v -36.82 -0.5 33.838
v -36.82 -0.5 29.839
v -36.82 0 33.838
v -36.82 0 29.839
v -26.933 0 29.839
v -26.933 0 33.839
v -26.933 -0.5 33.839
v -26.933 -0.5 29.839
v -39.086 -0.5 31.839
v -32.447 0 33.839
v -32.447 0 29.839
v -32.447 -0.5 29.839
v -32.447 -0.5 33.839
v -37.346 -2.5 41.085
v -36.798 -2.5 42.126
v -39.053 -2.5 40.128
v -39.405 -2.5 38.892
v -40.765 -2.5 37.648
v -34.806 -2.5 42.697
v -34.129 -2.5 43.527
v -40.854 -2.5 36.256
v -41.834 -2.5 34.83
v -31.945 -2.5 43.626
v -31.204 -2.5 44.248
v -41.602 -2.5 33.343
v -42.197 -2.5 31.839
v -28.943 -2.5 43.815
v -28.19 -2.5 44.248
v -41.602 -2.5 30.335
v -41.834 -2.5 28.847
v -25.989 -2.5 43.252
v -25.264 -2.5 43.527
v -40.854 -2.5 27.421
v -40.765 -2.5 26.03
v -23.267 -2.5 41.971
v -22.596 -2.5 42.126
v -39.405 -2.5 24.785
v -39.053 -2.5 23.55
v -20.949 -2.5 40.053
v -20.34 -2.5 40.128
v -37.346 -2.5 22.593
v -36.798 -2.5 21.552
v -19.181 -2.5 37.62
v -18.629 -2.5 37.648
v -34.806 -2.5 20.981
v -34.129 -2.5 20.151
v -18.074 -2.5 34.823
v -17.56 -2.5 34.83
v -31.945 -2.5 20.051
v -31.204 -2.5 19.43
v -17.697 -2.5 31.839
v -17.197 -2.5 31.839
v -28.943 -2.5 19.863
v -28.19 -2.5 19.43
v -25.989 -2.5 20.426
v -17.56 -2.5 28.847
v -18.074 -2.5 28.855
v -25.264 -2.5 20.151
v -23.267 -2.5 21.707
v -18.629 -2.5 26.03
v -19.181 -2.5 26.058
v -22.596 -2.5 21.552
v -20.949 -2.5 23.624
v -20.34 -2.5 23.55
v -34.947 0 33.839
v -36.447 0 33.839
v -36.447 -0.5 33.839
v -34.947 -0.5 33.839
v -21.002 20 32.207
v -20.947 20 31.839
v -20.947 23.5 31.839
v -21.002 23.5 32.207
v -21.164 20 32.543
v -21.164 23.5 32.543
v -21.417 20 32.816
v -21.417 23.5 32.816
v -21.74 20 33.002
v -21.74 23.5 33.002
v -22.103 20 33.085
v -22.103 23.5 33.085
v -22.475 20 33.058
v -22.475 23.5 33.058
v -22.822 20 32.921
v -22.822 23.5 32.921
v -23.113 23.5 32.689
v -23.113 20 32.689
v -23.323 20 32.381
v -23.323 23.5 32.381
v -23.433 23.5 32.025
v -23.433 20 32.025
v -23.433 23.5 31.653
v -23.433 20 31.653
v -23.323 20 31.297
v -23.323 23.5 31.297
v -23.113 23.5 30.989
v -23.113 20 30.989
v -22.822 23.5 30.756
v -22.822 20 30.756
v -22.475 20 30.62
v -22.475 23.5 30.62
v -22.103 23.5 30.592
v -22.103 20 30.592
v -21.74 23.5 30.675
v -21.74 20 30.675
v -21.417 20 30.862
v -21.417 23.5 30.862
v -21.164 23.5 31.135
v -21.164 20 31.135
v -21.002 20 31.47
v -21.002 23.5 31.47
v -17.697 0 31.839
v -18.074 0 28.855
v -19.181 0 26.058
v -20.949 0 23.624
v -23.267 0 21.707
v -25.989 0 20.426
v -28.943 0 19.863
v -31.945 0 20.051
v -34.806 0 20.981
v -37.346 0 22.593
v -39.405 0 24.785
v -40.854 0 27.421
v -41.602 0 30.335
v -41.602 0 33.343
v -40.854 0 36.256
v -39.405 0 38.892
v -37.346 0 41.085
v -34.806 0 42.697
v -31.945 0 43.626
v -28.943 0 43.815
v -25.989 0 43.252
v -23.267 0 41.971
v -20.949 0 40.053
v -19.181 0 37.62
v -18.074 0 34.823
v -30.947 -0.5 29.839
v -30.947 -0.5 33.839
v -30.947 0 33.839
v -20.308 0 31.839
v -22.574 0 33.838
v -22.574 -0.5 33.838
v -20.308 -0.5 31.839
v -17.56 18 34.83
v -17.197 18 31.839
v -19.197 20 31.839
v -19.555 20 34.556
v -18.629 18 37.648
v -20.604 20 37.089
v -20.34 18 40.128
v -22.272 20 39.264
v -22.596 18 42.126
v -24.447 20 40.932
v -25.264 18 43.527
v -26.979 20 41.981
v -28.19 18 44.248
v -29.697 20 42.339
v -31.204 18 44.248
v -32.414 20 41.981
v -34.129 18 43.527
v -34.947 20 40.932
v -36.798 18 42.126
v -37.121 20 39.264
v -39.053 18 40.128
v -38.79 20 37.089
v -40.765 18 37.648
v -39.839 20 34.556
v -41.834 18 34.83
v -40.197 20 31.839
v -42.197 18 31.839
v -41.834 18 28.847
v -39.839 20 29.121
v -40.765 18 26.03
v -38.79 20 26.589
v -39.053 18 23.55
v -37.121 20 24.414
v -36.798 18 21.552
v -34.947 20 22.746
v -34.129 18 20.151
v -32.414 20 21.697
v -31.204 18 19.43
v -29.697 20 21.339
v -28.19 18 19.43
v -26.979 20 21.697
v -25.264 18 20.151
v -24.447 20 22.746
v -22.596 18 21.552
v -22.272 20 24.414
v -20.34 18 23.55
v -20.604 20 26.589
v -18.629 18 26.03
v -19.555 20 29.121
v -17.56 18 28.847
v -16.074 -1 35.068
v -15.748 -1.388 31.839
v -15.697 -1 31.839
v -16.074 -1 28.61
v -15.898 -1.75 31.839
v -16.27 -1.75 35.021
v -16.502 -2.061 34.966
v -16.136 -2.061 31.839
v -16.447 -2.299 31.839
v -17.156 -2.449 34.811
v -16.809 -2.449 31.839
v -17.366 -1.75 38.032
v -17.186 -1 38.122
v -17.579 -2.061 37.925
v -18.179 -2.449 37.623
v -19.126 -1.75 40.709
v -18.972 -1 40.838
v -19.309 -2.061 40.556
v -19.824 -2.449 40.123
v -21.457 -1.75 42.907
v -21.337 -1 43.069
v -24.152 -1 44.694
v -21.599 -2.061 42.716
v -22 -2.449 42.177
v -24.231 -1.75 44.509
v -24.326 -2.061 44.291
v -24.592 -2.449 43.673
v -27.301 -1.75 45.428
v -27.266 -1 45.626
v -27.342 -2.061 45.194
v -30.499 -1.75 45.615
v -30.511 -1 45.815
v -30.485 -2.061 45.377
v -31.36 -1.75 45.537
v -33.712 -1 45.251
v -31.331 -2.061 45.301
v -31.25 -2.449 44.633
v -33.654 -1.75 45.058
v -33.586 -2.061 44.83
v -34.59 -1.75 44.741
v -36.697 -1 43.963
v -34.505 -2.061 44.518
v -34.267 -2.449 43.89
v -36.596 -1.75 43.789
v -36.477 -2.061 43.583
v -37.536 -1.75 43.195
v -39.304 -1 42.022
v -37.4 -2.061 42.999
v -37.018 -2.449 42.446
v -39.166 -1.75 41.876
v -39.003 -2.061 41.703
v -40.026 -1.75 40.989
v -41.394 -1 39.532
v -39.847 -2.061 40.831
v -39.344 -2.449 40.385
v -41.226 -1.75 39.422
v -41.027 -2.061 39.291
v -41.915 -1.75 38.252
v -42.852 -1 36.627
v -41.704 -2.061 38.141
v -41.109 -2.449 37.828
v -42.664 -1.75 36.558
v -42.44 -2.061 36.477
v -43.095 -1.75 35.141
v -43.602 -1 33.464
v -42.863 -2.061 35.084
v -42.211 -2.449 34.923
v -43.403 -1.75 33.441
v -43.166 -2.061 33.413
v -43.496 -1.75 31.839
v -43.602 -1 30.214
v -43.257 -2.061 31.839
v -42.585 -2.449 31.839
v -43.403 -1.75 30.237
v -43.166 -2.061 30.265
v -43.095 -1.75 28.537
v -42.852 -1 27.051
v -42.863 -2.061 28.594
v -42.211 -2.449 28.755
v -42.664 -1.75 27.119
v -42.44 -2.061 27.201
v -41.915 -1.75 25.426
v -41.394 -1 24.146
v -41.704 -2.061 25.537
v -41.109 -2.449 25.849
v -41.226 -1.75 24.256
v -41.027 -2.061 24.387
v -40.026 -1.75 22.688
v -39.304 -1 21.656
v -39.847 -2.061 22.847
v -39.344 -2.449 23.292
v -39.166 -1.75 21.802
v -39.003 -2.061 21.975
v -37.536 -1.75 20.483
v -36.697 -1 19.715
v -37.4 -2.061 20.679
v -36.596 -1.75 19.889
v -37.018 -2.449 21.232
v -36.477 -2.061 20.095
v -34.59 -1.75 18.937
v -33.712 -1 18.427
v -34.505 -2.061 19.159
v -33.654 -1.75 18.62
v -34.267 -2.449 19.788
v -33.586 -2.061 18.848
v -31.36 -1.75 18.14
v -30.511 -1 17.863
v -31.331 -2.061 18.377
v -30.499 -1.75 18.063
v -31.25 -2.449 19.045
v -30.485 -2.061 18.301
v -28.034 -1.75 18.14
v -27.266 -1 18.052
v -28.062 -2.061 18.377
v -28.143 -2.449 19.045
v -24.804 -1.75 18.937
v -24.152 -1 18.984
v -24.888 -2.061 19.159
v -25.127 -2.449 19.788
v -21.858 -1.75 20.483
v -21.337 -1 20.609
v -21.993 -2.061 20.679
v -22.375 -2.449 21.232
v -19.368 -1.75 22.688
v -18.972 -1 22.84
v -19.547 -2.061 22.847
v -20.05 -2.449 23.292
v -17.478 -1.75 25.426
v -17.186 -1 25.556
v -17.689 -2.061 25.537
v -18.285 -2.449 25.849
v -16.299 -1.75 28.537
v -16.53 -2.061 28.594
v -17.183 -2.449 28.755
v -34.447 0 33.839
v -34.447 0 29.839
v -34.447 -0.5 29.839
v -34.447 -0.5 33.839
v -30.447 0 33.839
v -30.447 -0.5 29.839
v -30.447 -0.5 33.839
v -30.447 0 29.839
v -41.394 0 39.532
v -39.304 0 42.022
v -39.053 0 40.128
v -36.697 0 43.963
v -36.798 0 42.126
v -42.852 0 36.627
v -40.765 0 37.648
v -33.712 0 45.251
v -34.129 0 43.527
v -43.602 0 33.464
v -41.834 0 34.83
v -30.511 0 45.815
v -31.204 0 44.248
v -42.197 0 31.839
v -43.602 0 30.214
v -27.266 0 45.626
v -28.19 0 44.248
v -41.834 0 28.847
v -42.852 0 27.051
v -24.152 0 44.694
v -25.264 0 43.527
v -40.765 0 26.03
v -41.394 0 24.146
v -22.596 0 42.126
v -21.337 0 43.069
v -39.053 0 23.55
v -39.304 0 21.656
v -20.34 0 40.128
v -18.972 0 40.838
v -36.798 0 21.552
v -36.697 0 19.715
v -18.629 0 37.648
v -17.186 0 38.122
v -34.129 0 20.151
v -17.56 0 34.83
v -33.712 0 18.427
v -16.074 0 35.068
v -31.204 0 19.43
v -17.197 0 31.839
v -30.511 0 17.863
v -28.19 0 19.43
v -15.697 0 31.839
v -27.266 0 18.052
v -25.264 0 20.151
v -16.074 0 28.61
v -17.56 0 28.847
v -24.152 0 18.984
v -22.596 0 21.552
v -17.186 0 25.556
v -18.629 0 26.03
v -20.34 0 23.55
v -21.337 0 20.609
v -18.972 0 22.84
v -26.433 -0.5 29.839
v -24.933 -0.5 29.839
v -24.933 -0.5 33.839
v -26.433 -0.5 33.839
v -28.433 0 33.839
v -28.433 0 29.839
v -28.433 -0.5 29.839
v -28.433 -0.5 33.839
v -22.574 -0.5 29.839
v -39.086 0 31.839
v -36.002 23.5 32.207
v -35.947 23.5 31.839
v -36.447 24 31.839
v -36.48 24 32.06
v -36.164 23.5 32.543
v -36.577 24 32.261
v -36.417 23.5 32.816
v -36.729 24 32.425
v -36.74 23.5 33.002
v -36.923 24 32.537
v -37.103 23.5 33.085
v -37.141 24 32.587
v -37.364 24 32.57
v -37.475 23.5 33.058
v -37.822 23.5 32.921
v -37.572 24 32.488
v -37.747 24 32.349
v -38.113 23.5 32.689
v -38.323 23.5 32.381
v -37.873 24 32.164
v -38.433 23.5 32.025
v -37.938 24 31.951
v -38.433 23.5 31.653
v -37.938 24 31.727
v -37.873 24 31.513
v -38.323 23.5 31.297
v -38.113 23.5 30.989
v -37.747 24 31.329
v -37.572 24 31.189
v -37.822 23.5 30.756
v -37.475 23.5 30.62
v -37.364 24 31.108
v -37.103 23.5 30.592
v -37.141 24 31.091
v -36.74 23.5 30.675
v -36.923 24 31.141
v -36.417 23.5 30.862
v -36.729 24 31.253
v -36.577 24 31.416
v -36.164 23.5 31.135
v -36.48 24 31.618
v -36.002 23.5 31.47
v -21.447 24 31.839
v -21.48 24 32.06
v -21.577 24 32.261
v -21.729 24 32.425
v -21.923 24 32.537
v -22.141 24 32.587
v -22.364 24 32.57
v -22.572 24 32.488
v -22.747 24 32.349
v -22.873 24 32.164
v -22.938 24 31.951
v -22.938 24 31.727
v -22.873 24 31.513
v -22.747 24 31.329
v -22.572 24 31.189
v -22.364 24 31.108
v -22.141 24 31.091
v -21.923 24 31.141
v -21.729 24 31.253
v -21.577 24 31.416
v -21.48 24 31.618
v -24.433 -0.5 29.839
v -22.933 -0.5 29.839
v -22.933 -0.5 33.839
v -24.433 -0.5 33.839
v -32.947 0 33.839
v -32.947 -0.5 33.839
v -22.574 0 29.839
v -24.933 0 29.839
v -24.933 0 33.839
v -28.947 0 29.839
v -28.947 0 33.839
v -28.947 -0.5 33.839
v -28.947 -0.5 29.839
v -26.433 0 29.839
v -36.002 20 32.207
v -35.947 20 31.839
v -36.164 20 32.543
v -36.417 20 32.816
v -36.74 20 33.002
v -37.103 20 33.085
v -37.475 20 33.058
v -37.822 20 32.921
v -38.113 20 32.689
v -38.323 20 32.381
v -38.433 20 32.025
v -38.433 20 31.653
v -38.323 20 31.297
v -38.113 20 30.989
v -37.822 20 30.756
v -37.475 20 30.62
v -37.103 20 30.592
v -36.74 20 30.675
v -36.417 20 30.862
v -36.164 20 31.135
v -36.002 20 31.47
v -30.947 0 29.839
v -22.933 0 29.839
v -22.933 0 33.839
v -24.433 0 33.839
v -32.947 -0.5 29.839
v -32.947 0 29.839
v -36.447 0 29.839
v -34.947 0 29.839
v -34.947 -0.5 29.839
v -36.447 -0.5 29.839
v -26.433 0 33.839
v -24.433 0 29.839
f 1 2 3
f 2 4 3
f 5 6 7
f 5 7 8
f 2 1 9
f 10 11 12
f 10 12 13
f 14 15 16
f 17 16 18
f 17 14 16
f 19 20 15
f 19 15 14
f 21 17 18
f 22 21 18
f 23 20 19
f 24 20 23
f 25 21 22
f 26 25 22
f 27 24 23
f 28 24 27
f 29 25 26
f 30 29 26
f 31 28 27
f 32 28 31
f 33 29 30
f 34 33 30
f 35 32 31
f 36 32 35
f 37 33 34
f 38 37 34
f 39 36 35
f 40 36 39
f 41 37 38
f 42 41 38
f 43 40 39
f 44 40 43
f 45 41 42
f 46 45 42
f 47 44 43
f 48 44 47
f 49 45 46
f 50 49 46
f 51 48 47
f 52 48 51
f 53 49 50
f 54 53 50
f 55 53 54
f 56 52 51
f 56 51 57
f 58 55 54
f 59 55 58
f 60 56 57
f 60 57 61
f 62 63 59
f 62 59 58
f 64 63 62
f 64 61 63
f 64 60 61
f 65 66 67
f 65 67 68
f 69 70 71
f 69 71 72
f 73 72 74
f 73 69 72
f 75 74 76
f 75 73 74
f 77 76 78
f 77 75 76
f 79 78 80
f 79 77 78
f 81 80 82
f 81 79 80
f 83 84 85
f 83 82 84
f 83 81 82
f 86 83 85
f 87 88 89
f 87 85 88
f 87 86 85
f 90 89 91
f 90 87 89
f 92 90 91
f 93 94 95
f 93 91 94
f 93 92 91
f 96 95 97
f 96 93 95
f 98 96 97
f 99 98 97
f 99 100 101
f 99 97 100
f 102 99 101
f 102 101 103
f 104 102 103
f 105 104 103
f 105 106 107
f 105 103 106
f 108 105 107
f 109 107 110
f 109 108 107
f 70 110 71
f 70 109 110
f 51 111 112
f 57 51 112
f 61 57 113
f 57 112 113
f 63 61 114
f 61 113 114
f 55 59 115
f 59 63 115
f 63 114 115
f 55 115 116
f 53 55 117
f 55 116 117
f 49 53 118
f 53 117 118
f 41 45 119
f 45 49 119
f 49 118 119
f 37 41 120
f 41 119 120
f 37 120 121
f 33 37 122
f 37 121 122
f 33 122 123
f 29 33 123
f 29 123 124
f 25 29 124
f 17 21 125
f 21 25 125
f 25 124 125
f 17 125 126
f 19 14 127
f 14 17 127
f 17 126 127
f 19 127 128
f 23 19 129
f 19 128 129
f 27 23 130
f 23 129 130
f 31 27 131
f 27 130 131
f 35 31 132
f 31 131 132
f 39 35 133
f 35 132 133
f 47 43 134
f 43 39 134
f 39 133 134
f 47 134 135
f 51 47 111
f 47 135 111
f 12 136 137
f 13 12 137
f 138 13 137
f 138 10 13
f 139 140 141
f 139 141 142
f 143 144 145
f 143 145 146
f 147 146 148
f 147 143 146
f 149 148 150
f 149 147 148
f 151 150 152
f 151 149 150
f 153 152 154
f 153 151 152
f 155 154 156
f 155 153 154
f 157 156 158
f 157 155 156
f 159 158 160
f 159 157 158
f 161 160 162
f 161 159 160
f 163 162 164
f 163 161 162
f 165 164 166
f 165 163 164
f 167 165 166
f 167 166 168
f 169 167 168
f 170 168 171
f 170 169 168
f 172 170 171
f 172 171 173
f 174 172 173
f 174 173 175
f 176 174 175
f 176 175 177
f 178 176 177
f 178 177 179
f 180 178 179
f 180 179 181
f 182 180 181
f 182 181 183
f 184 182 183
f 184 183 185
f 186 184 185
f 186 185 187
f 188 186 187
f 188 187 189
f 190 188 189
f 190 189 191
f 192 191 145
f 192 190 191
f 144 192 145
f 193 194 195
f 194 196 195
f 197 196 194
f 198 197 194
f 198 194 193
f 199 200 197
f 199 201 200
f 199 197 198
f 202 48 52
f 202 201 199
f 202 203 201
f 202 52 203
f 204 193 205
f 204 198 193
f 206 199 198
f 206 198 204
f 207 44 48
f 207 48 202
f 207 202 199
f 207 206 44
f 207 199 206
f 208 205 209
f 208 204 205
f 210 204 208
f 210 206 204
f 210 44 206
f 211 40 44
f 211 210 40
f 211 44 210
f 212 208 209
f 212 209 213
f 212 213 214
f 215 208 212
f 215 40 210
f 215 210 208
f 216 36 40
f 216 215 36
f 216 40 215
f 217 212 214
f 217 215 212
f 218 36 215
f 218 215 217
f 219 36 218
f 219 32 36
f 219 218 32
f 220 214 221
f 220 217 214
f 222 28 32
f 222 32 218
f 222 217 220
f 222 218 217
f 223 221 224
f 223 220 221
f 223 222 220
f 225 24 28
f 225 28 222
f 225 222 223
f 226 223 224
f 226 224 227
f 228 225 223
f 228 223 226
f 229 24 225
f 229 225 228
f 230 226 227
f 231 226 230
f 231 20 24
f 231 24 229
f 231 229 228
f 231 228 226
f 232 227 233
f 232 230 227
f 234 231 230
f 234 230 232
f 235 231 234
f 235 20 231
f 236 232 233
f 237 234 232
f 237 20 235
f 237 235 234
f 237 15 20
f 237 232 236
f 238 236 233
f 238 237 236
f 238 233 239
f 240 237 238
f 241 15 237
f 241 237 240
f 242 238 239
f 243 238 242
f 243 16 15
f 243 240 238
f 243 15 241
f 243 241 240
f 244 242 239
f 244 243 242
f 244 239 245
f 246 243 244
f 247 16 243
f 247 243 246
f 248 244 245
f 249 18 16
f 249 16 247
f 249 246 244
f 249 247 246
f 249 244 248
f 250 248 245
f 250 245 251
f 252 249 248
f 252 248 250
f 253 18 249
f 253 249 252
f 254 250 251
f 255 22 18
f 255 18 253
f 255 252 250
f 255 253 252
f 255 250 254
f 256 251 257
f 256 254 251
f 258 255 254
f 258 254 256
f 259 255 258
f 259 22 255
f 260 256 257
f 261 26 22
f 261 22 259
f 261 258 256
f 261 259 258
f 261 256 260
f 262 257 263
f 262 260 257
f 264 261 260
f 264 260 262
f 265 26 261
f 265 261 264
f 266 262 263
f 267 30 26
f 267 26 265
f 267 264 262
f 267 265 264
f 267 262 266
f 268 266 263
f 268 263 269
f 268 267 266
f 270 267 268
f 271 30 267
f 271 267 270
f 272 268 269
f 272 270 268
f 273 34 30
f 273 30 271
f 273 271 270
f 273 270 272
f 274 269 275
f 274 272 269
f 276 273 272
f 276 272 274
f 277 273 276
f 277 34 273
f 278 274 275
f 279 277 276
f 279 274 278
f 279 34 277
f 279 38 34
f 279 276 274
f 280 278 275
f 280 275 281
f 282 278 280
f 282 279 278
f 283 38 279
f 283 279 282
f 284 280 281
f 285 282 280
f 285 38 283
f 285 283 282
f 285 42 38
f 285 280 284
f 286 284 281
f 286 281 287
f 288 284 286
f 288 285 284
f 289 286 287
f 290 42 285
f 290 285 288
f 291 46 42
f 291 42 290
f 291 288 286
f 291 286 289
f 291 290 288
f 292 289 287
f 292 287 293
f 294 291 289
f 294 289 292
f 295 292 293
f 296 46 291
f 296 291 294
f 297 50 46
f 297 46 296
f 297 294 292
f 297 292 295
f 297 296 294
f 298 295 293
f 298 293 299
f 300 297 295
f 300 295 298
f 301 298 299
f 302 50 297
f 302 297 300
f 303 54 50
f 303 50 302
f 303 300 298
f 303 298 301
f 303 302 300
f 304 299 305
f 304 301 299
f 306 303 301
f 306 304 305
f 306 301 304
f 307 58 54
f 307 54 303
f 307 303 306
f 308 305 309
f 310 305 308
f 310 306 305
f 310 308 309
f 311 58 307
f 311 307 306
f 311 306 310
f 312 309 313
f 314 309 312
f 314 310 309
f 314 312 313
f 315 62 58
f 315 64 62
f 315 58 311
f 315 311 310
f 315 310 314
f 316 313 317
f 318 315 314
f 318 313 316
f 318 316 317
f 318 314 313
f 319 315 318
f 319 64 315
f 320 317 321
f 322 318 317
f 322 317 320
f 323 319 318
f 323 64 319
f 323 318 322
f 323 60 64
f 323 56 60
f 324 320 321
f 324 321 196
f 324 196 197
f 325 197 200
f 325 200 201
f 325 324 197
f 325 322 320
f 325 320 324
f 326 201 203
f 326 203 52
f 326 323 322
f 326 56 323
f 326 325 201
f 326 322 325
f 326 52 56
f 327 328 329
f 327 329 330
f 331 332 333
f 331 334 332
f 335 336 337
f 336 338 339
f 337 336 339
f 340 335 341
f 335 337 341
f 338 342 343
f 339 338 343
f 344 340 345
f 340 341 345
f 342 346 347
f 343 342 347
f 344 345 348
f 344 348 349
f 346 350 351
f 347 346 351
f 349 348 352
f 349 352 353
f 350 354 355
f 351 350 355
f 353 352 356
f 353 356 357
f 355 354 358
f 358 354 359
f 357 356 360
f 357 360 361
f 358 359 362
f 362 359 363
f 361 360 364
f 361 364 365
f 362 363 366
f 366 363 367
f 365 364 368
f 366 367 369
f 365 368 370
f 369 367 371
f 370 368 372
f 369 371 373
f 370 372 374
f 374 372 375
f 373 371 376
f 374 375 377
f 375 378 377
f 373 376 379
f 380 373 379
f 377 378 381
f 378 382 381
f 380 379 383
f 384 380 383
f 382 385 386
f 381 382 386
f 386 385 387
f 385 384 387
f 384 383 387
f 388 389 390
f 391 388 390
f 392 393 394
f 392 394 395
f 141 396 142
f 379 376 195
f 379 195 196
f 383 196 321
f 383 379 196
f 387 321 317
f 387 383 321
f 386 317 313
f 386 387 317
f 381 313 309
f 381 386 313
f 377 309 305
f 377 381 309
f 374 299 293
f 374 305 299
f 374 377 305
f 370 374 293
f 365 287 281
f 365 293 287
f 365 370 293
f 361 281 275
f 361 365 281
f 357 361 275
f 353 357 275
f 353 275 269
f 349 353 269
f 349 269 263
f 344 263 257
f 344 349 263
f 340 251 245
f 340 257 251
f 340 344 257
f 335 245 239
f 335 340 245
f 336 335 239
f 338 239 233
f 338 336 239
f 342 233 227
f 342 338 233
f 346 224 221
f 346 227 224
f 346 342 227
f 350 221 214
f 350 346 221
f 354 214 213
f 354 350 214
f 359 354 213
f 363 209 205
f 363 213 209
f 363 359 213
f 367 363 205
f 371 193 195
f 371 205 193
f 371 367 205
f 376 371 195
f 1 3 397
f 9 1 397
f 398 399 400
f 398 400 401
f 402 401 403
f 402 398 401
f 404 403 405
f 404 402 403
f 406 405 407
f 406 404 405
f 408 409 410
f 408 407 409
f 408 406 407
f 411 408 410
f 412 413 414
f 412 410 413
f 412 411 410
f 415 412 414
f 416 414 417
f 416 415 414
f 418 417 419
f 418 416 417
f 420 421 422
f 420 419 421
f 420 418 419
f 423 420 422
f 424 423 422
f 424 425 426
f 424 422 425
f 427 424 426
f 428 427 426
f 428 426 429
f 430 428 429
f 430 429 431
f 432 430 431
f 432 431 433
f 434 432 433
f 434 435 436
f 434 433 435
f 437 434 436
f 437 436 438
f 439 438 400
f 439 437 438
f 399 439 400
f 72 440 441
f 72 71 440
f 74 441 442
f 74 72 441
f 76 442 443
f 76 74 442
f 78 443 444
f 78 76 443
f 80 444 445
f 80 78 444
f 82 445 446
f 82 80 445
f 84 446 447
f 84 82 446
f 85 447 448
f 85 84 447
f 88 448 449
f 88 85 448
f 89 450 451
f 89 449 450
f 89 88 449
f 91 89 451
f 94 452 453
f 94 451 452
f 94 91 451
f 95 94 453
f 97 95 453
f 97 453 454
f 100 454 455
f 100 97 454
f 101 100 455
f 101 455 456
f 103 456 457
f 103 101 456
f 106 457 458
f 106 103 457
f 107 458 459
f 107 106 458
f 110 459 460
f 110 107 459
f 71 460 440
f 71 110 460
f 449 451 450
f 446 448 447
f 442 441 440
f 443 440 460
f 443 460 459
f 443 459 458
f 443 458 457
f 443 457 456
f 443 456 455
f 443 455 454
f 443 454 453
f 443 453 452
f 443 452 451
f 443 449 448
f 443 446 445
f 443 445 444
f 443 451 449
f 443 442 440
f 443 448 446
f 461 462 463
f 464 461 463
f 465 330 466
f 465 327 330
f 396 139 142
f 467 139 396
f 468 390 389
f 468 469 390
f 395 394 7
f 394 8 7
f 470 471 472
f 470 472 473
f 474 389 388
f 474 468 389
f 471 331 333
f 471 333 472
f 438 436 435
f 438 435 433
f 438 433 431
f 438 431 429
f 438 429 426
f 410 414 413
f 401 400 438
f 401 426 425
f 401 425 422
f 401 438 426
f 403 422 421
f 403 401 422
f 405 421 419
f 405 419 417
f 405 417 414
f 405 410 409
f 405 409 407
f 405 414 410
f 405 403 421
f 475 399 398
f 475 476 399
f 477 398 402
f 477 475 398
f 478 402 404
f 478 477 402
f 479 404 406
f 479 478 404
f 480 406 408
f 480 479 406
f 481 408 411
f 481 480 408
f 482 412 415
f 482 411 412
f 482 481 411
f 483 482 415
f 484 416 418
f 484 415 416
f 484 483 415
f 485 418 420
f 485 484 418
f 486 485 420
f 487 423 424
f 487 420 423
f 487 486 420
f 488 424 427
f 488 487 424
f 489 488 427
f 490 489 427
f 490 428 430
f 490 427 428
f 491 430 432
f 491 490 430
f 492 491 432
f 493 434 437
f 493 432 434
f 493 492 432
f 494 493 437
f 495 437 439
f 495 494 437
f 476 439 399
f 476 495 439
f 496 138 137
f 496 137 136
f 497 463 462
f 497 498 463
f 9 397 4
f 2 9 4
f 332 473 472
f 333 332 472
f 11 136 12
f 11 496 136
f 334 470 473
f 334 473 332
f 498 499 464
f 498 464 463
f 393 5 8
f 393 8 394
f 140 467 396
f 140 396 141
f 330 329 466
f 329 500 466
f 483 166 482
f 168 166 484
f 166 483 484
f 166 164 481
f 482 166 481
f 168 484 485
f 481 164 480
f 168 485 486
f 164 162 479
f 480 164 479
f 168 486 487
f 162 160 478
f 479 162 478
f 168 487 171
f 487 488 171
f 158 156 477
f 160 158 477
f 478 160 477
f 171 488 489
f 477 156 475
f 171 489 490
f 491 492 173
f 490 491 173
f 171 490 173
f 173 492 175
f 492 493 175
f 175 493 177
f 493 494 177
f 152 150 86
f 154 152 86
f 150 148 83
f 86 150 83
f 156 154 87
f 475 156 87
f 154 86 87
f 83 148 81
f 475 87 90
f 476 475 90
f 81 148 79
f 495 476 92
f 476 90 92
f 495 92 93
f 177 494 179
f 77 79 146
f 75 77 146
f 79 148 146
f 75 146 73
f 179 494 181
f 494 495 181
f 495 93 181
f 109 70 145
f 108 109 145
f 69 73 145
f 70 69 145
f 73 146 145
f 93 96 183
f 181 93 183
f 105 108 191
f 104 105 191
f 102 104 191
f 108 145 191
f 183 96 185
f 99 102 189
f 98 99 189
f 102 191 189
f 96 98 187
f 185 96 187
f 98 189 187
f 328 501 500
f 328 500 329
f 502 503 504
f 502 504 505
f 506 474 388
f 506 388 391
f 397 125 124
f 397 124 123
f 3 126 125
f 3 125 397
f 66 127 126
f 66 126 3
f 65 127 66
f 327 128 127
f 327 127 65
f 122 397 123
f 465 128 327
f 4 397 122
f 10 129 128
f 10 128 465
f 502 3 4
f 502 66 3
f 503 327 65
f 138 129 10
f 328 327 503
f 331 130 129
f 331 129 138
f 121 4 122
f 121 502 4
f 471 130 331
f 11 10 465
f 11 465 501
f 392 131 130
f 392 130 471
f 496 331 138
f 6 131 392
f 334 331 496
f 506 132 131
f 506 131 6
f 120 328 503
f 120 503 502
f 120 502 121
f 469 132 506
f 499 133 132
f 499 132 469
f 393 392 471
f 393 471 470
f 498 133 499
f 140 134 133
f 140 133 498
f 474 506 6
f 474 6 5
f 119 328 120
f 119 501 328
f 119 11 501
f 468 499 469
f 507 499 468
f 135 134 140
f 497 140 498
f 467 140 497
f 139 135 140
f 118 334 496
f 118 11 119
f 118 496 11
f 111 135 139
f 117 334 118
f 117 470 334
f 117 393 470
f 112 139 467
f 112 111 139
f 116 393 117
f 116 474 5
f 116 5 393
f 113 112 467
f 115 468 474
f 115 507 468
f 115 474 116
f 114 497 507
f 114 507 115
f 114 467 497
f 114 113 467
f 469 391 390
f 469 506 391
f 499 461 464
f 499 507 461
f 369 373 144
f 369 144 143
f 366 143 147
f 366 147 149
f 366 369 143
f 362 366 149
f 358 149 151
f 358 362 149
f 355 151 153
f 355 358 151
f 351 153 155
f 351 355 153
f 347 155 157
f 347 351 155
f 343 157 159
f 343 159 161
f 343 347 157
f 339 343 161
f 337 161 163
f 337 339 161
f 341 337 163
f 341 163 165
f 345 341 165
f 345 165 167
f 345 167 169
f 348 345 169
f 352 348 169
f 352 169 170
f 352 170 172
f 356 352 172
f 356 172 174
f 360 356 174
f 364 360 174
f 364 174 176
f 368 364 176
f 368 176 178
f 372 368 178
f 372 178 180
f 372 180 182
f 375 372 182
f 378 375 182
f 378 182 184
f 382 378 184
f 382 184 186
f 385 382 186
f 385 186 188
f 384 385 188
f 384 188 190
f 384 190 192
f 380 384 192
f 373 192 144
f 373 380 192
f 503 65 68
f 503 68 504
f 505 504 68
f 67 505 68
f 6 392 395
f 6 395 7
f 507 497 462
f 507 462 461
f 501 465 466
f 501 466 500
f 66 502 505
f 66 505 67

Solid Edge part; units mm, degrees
sketch "Sketch1" plane through (0, 0, 0) normal (0, -1, 0) x (1, 0, 0)
  circle A0 centre (-29.6968, 31.8389) radius 12.5
  dimension "D1" = 25
extrude "Protrusion1" add sketch "Sketch1" against normal blind 20
chamfer "Chamfer_1" distance 2 angle 45 1 edges at (-42.1968, 20, 31.8389)
sketch "Sketch2" plane through (-29.6968, 0, 31.8389) normal (0, -1, 0) x (1, 0, 0)
  circle A0 centre (0, 0) radius 14
  circle A1 centre (0, 0) radius 12
extrude "ExtrudedProtrusion_2" add sketch "Sketch2" along normal blind 2.5
fillet "Round_1" radius 1.5 1 edges at (-43.6968, -2.5, 31.8389)
sketch "Sketch3" plane through (-29.6968, 20, 31.8389) normal (0, 1, 0) x (1, 0, 0)
  circle A0 centre (7.5, 0) radius 1.25
  circle A1 centre (-7.5, 0) radius 1.25
  dimension "D1" = 7.5
  dimension "D2" = 7.5
  dimension "D3" = 2.5
  dimension "D4" = 2.5
extrude "ExtrudedProtrusion_3" add sketch "Sketch3" along normal blind 4
chamfer "Chamfer_2" distance 0.5 angle 45 2 edges at (-23.4468, 24, 31.8389) (-38.4468, 24, 31.8389)
sketch "Sketch4" plane through (-29.6968, 0, 31.8389) normal (0, -1, 0) x (-1, 0, 0)
  line L0 (-1.2639, 2) -> (-1.2639, -2)
  line L1 (-1.2639, -2) -> (-2.7639, -2)
  line L2 (-2.7639, -2) -> (-2.7639, 2)
  line L3 (-2.7639, 2) -> (-1.2639, 2)
  line L4 (-3.2639, 2) -> (-3.2639, -2)
  line L5 (-3.2639, -2) -> (-4.7639, -2)
  line L6 (-4.7639, -2) -> (-4.7639, 2)
  line L7 (-4.7639, 2) -> (-3.2639, 2)
  line L8 (-5.2639, 2) -> (-5.2639, -2)
  line L9 (-5.2639, -2) -> (-6.7639, -2)
  line L10 (-6.7639, -2) -> (-6.7639, 2)
  line L11 (-6.7639, 2) -> (-5.2639, 2)
  line L12 (2.75, 2) -> (2.75, -2)
  line L13 (2.75, -2) -> (1.25, -2)
  line L14 (1.25, -2) -> (1.25, 2)
  line L15 (1.25, 2) -> (2.75, 2)
  line L16 (4.75, 2) -> (4.75, -2)
  line L17 (4.75, -2) -> (3.25, -2)
  line L18 (3.25, -2) -> (3.25, 2)
  line L19 (3.25, 2) -> (4.75, 2)
  line L20 (6.75, 2) -> (6.75, -2)
  line L21 (6.75, -2) -> (5.25, -2)
  line L22 (5.25, -2) -> (5.25, 2)
  line L23 (5.25, 2) -> (6.75, 2)
  line L24 (-7.1233, 2) -> (-7.1233, -1.9996)
  line L25 (-7.1233, -1.9996) -> (-9.3891, 0)
  line L26 (-9.3891, 0) -> (-7.1233, 2)
  line L27 (7.1233, 2) -> (7.1233, -1.9996)
  line L28 (7.1233, -1.9996) -> (9.3891, 0)
  line L29 (9.3891, 0) -> (7.1233, 2)
  line L30 (0.75, 2) -> (0.75, -2)
  line L31 (0.75, -2) -> (-0.75, -2)
  line L32 (-0.75, -2) -> (-0.75, 2)
  line L33 (-0.75, 2) -> (0.75, 2)
  dimension "D1" = 1.5
  dimension "D2" = 4
extrude "ExtrudedProtrusion_4" add sketch "Sketch4" along normal blind 0.5
